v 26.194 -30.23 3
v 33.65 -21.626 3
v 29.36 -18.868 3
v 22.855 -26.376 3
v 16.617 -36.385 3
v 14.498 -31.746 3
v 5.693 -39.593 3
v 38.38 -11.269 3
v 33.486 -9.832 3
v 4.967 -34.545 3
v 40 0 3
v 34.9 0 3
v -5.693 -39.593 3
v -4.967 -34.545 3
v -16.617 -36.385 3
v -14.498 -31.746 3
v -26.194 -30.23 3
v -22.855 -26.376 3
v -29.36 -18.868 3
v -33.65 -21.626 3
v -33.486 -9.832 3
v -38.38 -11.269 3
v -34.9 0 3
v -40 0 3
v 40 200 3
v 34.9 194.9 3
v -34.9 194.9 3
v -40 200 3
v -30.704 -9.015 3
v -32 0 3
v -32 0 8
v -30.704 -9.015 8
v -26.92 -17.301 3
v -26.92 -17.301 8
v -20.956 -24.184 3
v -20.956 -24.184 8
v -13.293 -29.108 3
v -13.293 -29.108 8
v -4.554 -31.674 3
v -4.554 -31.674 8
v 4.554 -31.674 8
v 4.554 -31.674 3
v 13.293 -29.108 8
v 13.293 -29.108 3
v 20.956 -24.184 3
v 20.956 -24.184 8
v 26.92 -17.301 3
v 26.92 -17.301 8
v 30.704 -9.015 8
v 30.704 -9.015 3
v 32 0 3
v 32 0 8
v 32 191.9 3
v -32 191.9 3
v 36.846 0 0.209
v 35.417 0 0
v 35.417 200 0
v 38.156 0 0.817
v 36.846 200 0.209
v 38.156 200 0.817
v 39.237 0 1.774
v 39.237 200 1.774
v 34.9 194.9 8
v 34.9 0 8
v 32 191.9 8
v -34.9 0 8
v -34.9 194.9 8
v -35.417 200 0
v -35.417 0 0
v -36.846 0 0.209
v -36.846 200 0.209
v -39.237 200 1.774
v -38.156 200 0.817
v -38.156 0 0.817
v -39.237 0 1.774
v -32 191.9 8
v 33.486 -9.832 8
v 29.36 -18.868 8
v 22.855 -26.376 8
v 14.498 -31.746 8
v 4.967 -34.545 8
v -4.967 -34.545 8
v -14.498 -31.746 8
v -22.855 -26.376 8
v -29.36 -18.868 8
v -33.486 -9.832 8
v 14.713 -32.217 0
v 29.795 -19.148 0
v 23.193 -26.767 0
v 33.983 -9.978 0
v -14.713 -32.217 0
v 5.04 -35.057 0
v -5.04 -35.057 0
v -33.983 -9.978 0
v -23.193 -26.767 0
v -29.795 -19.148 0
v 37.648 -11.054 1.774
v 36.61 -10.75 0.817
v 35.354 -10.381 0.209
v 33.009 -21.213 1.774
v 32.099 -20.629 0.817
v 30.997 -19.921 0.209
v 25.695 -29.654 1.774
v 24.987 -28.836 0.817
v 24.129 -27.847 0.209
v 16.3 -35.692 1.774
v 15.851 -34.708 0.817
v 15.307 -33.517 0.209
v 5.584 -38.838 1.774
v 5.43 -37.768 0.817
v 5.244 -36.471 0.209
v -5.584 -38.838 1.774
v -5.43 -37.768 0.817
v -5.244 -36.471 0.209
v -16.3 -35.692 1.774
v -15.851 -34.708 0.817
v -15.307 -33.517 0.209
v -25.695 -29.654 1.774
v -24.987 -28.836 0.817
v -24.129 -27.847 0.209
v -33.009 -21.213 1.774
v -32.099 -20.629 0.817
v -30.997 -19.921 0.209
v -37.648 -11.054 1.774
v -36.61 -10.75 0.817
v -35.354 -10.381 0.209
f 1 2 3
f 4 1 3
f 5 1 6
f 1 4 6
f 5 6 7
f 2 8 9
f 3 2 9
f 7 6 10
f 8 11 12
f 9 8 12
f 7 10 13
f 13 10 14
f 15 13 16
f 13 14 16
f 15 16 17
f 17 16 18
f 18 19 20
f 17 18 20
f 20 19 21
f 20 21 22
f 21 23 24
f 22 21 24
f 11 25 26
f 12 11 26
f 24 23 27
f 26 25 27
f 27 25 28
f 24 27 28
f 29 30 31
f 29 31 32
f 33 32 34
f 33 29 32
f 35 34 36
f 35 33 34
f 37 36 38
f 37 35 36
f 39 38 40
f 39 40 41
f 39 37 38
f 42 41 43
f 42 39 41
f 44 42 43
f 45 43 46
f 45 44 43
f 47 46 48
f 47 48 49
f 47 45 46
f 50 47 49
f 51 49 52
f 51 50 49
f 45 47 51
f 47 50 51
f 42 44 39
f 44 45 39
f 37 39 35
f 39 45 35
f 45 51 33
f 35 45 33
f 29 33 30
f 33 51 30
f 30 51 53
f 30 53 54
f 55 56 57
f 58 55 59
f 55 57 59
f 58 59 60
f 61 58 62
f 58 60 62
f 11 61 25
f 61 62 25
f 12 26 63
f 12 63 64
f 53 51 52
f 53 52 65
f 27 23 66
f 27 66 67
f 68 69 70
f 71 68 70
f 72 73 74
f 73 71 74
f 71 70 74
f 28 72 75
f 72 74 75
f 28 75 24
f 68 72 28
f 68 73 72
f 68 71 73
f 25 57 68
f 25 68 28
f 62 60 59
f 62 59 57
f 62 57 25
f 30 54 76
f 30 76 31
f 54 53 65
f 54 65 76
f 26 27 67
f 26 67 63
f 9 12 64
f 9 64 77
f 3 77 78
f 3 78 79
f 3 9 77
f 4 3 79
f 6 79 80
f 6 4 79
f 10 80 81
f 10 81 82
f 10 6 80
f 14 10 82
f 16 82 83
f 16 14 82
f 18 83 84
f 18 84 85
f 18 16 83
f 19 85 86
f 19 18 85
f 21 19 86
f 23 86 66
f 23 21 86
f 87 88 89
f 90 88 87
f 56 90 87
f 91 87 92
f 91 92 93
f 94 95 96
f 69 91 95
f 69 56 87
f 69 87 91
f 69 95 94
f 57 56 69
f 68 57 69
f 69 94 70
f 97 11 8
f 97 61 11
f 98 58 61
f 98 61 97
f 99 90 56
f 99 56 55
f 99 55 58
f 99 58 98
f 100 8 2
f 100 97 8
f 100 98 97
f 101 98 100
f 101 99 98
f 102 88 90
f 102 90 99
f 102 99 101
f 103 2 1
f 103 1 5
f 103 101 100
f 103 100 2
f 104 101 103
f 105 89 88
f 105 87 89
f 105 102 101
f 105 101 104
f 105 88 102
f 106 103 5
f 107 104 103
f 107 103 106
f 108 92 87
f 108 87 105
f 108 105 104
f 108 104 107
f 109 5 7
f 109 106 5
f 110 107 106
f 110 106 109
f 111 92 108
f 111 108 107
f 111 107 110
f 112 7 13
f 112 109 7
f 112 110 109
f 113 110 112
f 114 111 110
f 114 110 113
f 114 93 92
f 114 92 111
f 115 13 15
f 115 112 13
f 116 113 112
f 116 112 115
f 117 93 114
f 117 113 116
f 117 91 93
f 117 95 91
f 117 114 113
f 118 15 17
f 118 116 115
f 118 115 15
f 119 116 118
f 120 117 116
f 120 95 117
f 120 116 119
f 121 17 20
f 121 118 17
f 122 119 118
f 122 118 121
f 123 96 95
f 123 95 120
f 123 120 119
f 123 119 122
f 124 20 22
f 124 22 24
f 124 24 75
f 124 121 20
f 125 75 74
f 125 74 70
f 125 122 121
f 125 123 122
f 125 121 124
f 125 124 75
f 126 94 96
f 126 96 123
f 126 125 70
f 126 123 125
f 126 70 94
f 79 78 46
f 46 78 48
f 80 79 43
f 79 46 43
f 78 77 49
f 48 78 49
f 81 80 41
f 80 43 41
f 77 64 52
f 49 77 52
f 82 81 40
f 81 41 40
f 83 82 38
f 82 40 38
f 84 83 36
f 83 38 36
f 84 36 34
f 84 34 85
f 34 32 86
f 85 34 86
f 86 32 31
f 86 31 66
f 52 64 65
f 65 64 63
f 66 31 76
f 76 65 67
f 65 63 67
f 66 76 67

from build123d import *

# Parameters (mm, degrees)
RESSALTO_EXTRUS_O1_DEPTH = 3
RESSALTO_EXTRUS_O2_DEPTH = 5
FILETE1_R                = 5


with BuildPart() as part:
    # Esboço1 → Ressalto-extrusão1 (new body)
    with BuildSketch(Plane.XY):
        with BuildLine():
            Line((-40, 0), (-40, 200))
            Line((-40, 200), (40, 200))
            Line((40, 200), (40, 0))
            ThreePointArc((40, 0), (0, -40), (-40, 0))
        make_face()
    extrude(amount=RESSALTO_EXTRUS_O1_DEPTH)

    # Esboço2 → Ressalto-extrusão2 (add)
    with BuildSketch(Plane.XY.offset(3)):
        with BuildLine():
            Line((-34.9, 0), (-34.9, 194.9))
            Line((-34.9, 194.9), (34.9, 194.9))
            Line((34.9, 194.9), (34.9, 0))
            ThreePointArc((34.9, 0), (0, -34.9), (-34.9, 0))
        make_face()
        with BuildLine():
            Line((32, 0), (32, 191.9))
            Line((32, 191.9), (-32, 191.9))
            Line((-32, 191.9), (-32, 0))
            ThreePointArc((-32, 0), (0, -32), (32, 0))
        make_face(mode=Mode.SUBTRACT)
    extrude(amount=RESSALTO_EXTRUS_O2_DEPTH)

    # Filete1
    # the kernel refuses this fillet: 5 mm, written as the material it takes off along each edge
    with BuildSketch(Plane(origin=(40, 211.456439237, 0), x_dir=(-1, 0, 0), z_dir=(0, -1, 0))) as filete1_piece_1:
        with BuildLine():
            CenterArc((4.582575695, -5), FILETE1_R, 90, 66.421821522)
            Line((0, -3), (-0.091651514, -2.96))
            ThreePointArc((-0.091651514, -2.96), (-0.1, -1.5), (-0.1, 0))
            Line((-0.1, 0), (0, 0.1))
            Line((0, 0.1), (4.582575695, 0.1))
            Line((4.582575695, 0.1), (4.582575695, 0))
        make_face()
    extrude(amount=211.456439237, mode=Mode.SUBTRACT)
    with BuildSketch(Plane(origin=(0, 0, 0), x_dir=(1, 0, 0), z_dir=(0, 1, 0))) as filete1_piece_2:
        with BuildLine():
            CenterArc((35.417424305, -5), FILETE1_R, 23.578178478, 66.421821522)
            Line((35.417424305, 0), (35.417424305, 0.1))
            Line((35.417424305, 0.1), (40, 0.1))
            Line((40, 0.1), (40.1, 0))
            ThreePointArc((40.1, 0), (40.1, -1.5), (40.091651514, -2.96))
            Line((40.091651514, -2.96), (40, -3))
        make_face()
    revolve(axis=Axis((0, 0, 0), (0, 0, -1)), revolution_arc=180, mode=Mode.SUBTRACT)
    with BuildSketch(Plane(origin=(-40, 0, 0), x_dir=(0, 0, 1), z_dir=(0, 1, 0))) as filete1_piece_3:
        with BuildLine():
            CenterArc((5, 4.582575695), FILETE1_R, 180, 66.421821522)
            Line((0, 4.582575695), (-0.1, 4.582575695))
            Line((-0.1, 4.582575695), (-0.1, 0))
            Line((-0.1, 0), (0, -0.1))
            ThreePointArc((0, -0.1), (1.5, -0.1), (2.96, -0.091651514))
            Line((2.96, -0.091651514), (3, 0))
        make_face()
    extrude(amount=211.456439237, mode=Mode.SUBTRACT)


solid = part.part
